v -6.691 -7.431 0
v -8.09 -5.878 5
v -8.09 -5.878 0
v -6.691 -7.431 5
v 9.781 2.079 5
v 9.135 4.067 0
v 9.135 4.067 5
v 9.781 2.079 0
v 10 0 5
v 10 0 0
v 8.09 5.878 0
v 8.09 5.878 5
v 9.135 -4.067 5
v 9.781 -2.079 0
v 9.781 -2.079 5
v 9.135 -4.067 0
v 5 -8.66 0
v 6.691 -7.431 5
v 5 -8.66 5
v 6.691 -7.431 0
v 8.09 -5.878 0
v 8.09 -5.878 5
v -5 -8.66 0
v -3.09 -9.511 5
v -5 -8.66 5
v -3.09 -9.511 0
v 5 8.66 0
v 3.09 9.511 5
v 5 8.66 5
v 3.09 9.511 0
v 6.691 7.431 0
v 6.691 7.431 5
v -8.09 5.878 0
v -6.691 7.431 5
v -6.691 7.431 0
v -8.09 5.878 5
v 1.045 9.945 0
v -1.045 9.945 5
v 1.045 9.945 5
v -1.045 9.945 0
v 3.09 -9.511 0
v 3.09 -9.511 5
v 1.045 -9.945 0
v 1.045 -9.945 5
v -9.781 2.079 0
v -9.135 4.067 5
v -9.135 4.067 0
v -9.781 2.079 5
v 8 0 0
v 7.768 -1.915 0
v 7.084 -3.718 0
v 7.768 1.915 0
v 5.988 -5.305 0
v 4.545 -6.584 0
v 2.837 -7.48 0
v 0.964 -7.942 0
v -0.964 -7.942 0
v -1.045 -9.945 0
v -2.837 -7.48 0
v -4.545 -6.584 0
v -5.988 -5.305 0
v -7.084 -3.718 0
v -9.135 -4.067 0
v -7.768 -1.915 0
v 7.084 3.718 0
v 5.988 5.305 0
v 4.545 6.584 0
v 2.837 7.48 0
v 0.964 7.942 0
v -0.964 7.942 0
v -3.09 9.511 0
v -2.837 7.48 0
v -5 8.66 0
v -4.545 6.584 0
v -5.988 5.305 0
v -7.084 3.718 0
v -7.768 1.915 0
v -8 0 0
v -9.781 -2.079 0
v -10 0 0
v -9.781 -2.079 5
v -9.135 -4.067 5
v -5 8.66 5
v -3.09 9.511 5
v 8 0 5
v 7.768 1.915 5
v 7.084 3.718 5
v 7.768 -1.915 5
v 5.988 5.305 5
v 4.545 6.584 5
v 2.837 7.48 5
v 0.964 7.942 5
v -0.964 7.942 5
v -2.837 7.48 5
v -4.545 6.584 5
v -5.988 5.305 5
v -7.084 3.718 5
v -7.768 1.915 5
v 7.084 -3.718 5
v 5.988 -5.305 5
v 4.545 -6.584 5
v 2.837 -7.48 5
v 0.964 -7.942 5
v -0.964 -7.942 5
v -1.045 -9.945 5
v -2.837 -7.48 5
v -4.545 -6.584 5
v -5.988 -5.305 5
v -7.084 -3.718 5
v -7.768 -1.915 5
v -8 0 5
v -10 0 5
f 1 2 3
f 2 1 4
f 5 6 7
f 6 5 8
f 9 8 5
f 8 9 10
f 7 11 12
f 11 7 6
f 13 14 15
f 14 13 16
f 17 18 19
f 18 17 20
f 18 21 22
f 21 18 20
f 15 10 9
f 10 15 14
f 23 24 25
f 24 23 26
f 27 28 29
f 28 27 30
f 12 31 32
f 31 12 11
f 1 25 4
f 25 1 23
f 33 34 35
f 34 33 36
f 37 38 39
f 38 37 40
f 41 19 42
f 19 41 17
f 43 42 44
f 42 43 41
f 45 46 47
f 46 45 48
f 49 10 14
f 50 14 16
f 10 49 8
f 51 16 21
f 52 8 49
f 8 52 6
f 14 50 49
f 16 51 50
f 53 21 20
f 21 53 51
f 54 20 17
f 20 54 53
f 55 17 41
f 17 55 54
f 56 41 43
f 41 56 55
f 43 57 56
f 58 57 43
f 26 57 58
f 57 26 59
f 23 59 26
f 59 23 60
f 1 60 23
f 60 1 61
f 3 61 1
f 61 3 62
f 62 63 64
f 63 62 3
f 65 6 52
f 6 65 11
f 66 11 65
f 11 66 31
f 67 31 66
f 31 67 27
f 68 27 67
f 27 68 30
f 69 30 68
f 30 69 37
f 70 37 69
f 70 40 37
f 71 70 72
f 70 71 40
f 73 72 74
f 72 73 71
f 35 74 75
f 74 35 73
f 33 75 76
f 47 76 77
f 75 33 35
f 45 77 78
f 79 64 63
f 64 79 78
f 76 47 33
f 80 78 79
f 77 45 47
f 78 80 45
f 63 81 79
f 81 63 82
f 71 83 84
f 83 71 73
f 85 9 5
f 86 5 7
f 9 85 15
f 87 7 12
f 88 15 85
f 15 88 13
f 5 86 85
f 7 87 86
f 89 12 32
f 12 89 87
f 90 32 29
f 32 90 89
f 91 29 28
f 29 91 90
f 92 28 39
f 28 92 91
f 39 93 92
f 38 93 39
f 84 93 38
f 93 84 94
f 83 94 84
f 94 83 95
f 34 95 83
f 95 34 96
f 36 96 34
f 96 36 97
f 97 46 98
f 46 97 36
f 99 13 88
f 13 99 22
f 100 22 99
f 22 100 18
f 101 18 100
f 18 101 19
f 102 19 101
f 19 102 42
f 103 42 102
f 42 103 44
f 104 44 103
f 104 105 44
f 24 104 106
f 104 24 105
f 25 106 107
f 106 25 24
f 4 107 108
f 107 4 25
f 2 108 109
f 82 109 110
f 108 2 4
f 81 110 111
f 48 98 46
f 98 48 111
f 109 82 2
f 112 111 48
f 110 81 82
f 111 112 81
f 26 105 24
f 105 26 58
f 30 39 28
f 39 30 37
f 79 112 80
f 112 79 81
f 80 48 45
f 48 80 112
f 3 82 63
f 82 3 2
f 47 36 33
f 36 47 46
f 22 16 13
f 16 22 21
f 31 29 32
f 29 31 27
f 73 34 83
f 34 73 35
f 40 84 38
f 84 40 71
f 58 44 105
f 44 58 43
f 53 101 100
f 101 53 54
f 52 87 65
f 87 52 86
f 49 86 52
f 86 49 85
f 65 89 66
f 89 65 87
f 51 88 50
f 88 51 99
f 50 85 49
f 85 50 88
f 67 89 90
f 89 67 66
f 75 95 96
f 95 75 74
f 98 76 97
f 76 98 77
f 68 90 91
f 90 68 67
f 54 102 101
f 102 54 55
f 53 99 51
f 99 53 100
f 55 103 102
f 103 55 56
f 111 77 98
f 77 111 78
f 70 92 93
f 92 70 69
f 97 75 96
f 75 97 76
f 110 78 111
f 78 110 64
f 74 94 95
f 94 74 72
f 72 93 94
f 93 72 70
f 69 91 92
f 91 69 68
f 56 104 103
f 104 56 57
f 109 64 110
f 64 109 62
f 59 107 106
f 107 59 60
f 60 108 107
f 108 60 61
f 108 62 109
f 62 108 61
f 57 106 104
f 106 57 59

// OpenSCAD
//Rich Whiffen
//2025-08-22 Making a plain cylinder loop with rounded edges
// - update - isnt working - I didn't understand the 2d vs 3d thing for hull
// might need to switch to 'extrude' instead of 'cylinder'.

//start with a plain hollow cylinder 

thickness = 3;
inner_d = 16;
outter_d = 20;

inner_r = inner_d /2;
outter_r = outter_d /2;
height = 5;

translate([0, 0, 0])
difference() {
    cylinder(h = height, d = outter_d);
    cylinder(h = height, d = inner_d);
}

//try the hull example from reddit
// https://www.reddit.com/r/openscad/comments/1h12z83/comment/lz8eg3z/?utm_source=share&utm_medium=web3x&utm_name=web3xcss&utm_term=1&utm_content=share_button

hull()
{
    // Bottom cap
    translate ([inner_r + thickness/2, thickness/2, 0])
        circle (d=thickness);

    //Top cap
    translate ([inner_r + thickness/2, height - thickness/2, 0])
        circle (d=thickness);
}
